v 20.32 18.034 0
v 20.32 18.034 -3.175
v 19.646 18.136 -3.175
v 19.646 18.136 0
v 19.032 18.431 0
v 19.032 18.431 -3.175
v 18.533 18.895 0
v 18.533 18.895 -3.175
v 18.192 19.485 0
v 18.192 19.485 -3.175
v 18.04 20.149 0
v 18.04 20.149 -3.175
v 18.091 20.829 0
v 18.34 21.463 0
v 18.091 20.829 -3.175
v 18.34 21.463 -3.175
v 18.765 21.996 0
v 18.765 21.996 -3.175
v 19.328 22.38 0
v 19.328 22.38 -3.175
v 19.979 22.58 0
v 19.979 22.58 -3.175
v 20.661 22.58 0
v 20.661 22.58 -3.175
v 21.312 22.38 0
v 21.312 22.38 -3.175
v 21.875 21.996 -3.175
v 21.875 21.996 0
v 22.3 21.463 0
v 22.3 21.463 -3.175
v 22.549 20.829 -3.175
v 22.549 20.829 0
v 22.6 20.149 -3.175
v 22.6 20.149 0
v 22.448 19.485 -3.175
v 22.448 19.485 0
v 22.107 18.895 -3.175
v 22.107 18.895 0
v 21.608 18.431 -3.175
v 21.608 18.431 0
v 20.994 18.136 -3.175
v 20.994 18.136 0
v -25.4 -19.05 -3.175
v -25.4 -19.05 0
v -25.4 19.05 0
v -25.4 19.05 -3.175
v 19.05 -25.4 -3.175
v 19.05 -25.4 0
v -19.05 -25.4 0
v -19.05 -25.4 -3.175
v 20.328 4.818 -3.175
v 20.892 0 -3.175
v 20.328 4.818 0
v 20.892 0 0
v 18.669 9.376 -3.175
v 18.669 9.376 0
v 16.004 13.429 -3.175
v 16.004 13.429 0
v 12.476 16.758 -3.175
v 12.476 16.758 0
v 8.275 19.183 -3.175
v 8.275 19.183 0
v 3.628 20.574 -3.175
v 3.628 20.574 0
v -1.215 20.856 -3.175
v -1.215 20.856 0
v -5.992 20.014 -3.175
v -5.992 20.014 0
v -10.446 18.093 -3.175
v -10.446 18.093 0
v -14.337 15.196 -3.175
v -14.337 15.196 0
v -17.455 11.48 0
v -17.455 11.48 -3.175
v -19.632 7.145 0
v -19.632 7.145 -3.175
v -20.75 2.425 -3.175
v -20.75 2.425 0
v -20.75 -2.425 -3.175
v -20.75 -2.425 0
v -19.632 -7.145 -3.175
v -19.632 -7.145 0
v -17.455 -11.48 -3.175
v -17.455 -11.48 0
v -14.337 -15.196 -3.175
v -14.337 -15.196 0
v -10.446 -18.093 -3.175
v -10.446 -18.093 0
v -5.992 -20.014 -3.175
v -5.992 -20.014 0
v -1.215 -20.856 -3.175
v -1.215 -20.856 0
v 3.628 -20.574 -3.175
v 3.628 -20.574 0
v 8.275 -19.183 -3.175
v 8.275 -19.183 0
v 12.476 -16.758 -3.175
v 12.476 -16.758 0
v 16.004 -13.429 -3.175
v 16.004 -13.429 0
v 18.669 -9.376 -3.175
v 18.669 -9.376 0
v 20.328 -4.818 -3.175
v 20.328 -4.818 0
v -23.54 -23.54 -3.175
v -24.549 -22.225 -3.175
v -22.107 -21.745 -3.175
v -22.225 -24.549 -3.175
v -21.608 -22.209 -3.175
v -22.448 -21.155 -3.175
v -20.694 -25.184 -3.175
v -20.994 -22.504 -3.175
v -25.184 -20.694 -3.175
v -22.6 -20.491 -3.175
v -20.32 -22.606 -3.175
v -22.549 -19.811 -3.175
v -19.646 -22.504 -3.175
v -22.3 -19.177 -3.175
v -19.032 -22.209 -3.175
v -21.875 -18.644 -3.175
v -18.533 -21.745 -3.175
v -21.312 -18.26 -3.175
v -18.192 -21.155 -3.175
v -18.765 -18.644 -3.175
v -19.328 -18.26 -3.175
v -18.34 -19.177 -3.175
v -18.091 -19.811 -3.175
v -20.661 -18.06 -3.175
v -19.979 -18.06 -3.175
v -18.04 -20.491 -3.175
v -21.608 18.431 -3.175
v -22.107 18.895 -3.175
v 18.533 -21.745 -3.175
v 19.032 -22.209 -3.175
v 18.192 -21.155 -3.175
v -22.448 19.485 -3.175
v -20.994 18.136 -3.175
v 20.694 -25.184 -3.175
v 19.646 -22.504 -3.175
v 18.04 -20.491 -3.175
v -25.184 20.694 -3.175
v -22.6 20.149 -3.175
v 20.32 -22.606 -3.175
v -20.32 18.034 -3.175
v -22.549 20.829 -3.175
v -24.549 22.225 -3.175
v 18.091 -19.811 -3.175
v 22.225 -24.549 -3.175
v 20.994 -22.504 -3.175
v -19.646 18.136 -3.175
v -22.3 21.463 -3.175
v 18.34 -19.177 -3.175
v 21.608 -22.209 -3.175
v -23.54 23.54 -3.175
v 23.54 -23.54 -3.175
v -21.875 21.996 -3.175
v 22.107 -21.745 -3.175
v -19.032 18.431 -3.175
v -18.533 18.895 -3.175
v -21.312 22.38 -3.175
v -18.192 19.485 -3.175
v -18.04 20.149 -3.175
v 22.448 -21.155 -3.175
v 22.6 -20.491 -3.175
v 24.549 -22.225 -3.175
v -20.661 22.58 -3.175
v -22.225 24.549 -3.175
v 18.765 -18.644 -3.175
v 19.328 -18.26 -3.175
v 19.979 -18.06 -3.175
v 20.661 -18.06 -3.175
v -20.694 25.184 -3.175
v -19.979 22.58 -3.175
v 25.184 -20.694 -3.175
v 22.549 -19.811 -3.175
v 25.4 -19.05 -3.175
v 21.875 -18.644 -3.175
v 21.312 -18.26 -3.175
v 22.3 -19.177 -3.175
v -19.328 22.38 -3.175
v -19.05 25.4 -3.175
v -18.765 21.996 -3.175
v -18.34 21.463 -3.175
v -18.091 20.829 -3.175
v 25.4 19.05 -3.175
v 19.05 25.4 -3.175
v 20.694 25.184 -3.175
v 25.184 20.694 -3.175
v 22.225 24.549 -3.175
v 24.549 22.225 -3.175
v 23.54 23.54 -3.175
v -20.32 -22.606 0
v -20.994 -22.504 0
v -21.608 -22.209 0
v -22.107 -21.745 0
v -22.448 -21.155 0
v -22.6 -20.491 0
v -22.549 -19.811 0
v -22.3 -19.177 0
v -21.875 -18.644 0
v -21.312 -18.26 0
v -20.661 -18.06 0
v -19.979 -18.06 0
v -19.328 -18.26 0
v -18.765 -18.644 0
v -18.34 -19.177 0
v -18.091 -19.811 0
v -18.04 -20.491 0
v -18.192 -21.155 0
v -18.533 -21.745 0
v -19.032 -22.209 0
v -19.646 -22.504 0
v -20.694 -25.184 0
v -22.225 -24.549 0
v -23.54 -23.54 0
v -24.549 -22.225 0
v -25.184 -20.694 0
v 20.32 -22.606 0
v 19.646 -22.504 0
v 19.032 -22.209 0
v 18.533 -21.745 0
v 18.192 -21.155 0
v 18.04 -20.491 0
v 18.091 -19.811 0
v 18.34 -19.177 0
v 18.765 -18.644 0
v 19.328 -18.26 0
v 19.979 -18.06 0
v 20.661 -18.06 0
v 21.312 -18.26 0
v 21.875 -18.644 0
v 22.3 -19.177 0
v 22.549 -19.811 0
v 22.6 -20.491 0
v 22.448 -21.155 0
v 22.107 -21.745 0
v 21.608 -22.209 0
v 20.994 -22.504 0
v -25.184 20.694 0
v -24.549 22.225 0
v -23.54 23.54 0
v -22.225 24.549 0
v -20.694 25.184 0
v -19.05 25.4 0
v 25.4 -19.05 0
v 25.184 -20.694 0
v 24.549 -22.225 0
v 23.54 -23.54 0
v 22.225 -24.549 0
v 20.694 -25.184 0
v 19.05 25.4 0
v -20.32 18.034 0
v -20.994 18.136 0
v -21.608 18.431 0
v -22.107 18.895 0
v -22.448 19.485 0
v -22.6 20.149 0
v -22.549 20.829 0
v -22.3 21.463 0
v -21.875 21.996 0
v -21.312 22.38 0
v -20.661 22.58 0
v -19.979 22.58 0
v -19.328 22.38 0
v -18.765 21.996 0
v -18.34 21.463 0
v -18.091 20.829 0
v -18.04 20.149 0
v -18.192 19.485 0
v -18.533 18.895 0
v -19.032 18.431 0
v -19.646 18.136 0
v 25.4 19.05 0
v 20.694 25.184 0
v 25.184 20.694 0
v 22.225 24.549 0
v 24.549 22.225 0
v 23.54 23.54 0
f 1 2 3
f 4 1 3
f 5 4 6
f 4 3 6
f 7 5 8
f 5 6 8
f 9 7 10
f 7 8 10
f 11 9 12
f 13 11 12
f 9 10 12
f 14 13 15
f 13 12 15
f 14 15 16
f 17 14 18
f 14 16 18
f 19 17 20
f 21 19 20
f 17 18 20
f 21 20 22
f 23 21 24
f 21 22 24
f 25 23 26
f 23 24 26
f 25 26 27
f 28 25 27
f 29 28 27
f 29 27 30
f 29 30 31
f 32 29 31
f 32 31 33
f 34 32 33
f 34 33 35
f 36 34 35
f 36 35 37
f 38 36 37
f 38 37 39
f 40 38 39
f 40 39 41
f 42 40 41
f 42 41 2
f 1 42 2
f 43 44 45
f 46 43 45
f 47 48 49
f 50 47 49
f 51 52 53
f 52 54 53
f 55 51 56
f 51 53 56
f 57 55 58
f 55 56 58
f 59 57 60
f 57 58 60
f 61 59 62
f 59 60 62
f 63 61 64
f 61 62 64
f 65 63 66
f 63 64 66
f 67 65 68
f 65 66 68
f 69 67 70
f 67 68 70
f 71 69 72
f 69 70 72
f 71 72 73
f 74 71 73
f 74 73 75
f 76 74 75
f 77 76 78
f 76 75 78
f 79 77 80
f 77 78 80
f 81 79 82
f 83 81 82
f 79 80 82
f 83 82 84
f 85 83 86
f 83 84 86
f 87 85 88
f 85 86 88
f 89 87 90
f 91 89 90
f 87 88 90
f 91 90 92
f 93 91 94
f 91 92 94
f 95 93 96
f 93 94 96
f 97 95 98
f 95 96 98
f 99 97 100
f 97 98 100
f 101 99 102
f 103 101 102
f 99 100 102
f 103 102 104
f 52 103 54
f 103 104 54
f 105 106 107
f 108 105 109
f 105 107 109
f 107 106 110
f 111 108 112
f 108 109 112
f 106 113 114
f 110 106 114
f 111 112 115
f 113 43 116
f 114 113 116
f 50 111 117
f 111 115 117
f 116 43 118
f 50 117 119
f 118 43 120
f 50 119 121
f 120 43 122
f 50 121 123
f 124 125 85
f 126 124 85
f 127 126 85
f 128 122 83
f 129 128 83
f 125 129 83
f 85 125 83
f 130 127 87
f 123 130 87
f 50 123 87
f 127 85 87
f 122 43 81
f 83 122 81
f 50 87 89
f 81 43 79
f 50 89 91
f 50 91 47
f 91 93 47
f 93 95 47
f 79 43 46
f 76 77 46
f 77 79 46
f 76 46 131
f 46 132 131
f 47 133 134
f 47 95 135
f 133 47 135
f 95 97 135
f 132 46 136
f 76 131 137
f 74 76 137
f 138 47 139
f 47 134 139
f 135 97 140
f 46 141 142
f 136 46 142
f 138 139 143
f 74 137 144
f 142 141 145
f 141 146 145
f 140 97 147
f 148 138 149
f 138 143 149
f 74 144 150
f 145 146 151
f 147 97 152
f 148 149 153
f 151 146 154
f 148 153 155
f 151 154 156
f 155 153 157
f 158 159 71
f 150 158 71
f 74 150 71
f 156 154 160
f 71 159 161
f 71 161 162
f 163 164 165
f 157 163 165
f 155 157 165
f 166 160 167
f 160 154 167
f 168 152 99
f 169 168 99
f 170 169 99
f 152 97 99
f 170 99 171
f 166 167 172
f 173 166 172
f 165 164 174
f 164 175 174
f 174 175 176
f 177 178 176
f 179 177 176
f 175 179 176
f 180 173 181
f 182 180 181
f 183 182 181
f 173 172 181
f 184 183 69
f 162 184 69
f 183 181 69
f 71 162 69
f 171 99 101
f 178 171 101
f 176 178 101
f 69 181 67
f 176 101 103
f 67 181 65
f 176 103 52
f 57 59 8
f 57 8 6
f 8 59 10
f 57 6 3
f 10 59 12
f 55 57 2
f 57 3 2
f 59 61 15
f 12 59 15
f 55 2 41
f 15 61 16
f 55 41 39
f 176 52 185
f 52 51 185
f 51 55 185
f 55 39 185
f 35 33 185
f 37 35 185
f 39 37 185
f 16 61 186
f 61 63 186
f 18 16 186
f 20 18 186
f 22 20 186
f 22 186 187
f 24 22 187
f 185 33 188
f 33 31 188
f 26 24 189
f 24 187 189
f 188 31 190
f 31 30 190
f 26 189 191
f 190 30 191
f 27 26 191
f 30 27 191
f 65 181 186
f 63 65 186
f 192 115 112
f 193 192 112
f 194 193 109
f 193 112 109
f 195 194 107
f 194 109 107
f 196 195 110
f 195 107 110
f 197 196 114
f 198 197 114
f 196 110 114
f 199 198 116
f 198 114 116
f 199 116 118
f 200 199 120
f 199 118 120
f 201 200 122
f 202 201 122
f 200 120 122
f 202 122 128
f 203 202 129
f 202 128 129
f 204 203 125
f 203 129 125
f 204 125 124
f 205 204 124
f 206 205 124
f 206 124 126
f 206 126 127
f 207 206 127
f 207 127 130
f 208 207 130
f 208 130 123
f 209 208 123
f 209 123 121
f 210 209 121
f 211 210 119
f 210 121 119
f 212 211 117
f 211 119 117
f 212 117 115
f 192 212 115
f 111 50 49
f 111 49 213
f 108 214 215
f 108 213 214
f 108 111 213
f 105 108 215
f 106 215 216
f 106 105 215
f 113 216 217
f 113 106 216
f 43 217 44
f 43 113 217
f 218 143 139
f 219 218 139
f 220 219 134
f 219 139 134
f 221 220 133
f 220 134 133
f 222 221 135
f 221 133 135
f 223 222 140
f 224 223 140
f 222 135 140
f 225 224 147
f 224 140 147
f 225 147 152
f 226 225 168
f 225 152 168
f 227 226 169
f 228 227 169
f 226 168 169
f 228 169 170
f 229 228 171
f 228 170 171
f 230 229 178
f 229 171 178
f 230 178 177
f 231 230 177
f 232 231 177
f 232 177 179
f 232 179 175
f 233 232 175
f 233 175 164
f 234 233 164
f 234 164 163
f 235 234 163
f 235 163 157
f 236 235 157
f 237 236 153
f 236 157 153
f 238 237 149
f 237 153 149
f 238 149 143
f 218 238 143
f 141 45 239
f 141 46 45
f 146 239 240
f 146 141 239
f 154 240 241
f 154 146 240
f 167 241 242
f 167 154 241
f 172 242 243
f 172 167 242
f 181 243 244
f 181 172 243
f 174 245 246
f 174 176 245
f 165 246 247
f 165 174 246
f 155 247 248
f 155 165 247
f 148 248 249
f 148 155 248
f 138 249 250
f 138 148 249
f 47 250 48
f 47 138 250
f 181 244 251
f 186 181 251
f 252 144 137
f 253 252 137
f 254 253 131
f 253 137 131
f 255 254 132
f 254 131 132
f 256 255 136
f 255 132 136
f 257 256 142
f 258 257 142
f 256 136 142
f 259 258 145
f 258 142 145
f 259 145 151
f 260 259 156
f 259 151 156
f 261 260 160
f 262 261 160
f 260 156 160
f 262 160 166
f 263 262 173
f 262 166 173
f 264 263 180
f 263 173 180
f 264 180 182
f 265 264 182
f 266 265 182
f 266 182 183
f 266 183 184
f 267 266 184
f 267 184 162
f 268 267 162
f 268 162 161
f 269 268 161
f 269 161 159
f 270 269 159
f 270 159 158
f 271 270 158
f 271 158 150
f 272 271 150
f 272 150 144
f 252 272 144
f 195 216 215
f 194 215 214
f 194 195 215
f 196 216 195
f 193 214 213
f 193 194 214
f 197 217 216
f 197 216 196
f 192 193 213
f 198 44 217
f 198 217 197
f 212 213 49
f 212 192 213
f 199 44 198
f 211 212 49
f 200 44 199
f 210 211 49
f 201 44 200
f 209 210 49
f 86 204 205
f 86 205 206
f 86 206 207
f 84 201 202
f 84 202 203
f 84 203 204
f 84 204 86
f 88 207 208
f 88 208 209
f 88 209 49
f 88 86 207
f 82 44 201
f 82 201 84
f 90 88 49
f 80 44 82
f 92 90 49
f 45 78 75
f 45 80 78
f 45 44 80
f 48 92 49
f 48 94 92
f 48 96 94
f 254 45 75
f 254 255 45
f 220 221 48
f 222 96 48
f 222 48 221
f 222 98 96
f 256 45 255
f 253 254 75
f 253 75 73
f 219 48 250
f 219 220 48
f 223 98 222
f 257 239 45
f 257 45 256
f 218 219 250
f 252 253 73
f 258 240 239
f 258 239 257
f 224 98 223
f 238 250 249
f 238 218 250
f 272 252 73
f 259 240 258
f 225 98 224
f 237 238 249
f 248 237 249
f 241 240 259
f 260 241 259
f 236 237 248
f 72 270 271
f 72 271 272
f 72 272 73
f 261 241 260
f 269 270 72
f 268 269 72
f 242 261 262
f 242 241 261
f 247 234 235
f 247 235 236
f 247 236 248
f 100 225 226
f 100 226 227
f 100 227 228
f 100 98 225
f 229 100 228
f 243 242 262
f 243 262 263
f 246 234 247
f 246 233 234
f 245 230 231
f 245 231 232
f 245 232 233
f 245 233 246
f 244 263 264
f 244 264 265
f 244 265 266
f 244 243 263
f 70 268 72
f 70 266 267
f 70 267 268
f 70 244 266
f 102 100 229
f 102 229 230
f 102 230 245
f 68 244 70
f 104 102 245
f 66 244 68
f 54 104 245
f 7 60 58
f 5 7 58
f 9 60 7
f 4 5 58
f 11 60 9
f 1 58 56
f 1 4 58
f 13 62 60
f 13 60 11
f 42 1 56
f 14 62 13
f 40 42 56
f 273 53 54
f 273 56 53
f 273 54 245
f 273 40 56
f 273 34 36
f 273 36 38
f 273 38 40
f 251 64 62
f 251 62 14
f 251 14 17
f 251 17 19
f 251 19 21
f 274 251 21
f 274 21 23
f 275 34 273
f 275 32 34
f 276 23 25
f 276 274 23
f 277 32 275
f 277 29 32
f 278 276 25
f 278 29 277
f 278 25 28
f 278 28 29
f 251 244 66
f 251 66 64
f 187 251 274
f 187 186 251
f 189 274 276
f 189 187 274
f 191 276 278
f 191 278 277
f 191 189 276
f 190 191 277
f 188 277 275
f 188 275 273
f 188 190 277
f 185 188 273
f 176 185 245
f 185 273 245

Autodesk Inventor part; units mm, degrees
ref_plane "YZ Plane" through (0, 0, 0) normal (1, 0, 0) x (0, 1, 0)
ref_plane "XZ Plane" through (0, 0, 0) normal (0, 1, 0) x (-1, 0, 0)
ref_plane "XY Plane" through (0, 0, 0) normal (0, 0, 1) x (1, 0, 0)
sketch "Sketch1" plane through (0, 0, 0) normal (0, 0, 1) x (1, 0, 0)
  line L0 (-13, 12) -> (13, 12)
  line L1 (13, 12) -> (13, -12)
  line L2 (13, -12) -> (-13, -12)
  line L3 (-13, -12) -> (-13, 12)
  line L4 (-13, 3.25) -> (-15, 3.25)
  line L5 (-15, 3.25) -> (-15, -3.25)
  line L6 (-15, -3.25) -> (-13, -3.25)
  line L7 (-13, -3.25) -> (-13, 3.25)
  line L8 (13, 3.25) -> (15, 3.25)
  line L9 (15, 3.25) -> (15, -3.25)
  line L10 (15, -3.25) -> (13, -3.25)
  line L11 (13, -3.25) -> (13, 3.25)
  line L12 (-25.4, 25.4) -> (25.4, 25.4)
  line L13 (25.4, 25.4) -> (25.4, -25.4)
  line L14 (25.4, -25.4) -> (-25.4, -25.4)
  line L15 (-25.4, -25.4) -> (-25.4, 25.4)
  circle A0 centre (0, 0) radius 7.1437
  circle A1 centre (-3, 12) radius 1.5
  line L16 (-13, 8) -> (-9, 12)
  line L17 (9, 12) -> (13, 8)
  line L18 (13, -8) -> (9, -12)
  line L19 (-13, -8) -> (-9, -12)
  circle A2 centre (0, 0) radius 20.8915
  circle A3 centre (-21.997, 0) radius 1.5875
  circle A4 centre (10.9985, 19.05) radius 1.5875
  circle A5 centre (10.9985, -19.05) radius 1.5875
  circle A6 centre (0, 0) radius 21.997 construction
  point P0 (-14, 3.25)
  point P1 (14, 3.25)
  point P2 (-14, -3.25)
  point P3 (14, -3.25)
  point P4 (-20.32, 20.32)
  point P5 (20.32, 20.32)
  point P6 (20.32, -20.32)
  point P7 (-20.32, -20.32)
  dimension "d0" = 24
  dimension "d1" = 12
  dimension "d2" = 26
  dimension "d3" = 13
  dimension "d4" = 2
  dimension "d5" = 6.5
  dimension "d6" = 3.25
  dimension "d7" = 2
  dimension "d8" = 14.2875
  dimension "d9" = 50.8
  dimension "d10" = 25.4
  dimension "d11" = 50.8
  dimension "d12" = 25.4
  dimension "d13" = 3
  dimension "d14" = 10
  dimension "d15" = 4
  dimension "d16" = 4
  dimension "d17" = 4
  dimension "d18" = 4
  dimension "d19" = 4
  dimension "d20" = 5.08
  dimension "d21" = 5.08
  dimension "d22" = 5.08
  dimension "d23" = 5.08
  dimension "d34" = 40.64
  dimension "d35" = 40.64
  dimension "d44" = 41.783
  dimension "d45" = 3.175
  dimension "d46" = 3.175
  dimension "d47" = 3.175
  dimension "d48" = 38.1
  dimension "d49" = 38.1
  dimension "d50" = 38.1
  dimension "d51" = 38.1
  dimension "d53" = 43.9941
extrude "Extrusion1" add sketch "Sketch1" against normal blind 3.175 contours L0 L16 L3 | L0 L1 L17 | L19 L2 L3 | L18 L1 L2 | L12 L13 L14 L15 | A2 A5 A3 A4 | A4 A2 | A2 A4 | A5 A2 | A2 A5 | A3 A2 | A2 A3
fillet "Fillet1" radius 3.175 4 edges at (-13, -3.25, -1.5875) (-13, 3.25, -1.5875) (13, 3.25, -1.5875) (13, -3.25, -1.5875)
hole "Hole1" at (-20.32, 20.32, 0) at (20.32, 20.32, 0) at (20.32, -20.32, 0) at (-20.32, -20.32, 0) direction (0, 0, -1) diameter 4.572 end through all
extrude "Extrusion2" cut sketch "Sketch1" against normal blind 25.4 contours L0 L16 L3 | L0 A1 L17 L1 L18 L2 L19 L3 L16 | L0 A1 | L0 L1 L17 | L19 L2 L3 | L18 L1 L2 | A0 | A2 A5 A3 A4 | A4 A2 | A2 A5 | A3 A2 picked at (-3.284, 11.1238) picked at (10.4165, 17.9252) picked at (10.4165, -17.9252) picked at (-20.7286, 0)
fillet "Fillet2" radius 6.35 4 edges at (25.4, 25.4, -1.5875) (-25.4, 25.4, -1.5875) (25.4, -25.4, -1.5875) (-25.4, -25.4, -1.5875)
equation "\"d1\" = 0.5 * d0"
equation "\"d3\" = 0.5 * d2"
equation "\"d6\" = 0.5 * d5"
equation "\"d7\" = d4"
equation "\"d10\" = 0.5 * d9"
equation "\"d12\" = 0.5 * d11"
equation "\"d16\" = d15"
equation "\"d17\" = d15"
equation "\"d18\" = d15"
equation "\"d19\" = d15"
equation "\"d22\" = d21"
equation "\"d23\" = d21"
equation "\"d46\" = d45"
equation "\"d47\" = d45"
properties part number "BD gearbox mount block"
